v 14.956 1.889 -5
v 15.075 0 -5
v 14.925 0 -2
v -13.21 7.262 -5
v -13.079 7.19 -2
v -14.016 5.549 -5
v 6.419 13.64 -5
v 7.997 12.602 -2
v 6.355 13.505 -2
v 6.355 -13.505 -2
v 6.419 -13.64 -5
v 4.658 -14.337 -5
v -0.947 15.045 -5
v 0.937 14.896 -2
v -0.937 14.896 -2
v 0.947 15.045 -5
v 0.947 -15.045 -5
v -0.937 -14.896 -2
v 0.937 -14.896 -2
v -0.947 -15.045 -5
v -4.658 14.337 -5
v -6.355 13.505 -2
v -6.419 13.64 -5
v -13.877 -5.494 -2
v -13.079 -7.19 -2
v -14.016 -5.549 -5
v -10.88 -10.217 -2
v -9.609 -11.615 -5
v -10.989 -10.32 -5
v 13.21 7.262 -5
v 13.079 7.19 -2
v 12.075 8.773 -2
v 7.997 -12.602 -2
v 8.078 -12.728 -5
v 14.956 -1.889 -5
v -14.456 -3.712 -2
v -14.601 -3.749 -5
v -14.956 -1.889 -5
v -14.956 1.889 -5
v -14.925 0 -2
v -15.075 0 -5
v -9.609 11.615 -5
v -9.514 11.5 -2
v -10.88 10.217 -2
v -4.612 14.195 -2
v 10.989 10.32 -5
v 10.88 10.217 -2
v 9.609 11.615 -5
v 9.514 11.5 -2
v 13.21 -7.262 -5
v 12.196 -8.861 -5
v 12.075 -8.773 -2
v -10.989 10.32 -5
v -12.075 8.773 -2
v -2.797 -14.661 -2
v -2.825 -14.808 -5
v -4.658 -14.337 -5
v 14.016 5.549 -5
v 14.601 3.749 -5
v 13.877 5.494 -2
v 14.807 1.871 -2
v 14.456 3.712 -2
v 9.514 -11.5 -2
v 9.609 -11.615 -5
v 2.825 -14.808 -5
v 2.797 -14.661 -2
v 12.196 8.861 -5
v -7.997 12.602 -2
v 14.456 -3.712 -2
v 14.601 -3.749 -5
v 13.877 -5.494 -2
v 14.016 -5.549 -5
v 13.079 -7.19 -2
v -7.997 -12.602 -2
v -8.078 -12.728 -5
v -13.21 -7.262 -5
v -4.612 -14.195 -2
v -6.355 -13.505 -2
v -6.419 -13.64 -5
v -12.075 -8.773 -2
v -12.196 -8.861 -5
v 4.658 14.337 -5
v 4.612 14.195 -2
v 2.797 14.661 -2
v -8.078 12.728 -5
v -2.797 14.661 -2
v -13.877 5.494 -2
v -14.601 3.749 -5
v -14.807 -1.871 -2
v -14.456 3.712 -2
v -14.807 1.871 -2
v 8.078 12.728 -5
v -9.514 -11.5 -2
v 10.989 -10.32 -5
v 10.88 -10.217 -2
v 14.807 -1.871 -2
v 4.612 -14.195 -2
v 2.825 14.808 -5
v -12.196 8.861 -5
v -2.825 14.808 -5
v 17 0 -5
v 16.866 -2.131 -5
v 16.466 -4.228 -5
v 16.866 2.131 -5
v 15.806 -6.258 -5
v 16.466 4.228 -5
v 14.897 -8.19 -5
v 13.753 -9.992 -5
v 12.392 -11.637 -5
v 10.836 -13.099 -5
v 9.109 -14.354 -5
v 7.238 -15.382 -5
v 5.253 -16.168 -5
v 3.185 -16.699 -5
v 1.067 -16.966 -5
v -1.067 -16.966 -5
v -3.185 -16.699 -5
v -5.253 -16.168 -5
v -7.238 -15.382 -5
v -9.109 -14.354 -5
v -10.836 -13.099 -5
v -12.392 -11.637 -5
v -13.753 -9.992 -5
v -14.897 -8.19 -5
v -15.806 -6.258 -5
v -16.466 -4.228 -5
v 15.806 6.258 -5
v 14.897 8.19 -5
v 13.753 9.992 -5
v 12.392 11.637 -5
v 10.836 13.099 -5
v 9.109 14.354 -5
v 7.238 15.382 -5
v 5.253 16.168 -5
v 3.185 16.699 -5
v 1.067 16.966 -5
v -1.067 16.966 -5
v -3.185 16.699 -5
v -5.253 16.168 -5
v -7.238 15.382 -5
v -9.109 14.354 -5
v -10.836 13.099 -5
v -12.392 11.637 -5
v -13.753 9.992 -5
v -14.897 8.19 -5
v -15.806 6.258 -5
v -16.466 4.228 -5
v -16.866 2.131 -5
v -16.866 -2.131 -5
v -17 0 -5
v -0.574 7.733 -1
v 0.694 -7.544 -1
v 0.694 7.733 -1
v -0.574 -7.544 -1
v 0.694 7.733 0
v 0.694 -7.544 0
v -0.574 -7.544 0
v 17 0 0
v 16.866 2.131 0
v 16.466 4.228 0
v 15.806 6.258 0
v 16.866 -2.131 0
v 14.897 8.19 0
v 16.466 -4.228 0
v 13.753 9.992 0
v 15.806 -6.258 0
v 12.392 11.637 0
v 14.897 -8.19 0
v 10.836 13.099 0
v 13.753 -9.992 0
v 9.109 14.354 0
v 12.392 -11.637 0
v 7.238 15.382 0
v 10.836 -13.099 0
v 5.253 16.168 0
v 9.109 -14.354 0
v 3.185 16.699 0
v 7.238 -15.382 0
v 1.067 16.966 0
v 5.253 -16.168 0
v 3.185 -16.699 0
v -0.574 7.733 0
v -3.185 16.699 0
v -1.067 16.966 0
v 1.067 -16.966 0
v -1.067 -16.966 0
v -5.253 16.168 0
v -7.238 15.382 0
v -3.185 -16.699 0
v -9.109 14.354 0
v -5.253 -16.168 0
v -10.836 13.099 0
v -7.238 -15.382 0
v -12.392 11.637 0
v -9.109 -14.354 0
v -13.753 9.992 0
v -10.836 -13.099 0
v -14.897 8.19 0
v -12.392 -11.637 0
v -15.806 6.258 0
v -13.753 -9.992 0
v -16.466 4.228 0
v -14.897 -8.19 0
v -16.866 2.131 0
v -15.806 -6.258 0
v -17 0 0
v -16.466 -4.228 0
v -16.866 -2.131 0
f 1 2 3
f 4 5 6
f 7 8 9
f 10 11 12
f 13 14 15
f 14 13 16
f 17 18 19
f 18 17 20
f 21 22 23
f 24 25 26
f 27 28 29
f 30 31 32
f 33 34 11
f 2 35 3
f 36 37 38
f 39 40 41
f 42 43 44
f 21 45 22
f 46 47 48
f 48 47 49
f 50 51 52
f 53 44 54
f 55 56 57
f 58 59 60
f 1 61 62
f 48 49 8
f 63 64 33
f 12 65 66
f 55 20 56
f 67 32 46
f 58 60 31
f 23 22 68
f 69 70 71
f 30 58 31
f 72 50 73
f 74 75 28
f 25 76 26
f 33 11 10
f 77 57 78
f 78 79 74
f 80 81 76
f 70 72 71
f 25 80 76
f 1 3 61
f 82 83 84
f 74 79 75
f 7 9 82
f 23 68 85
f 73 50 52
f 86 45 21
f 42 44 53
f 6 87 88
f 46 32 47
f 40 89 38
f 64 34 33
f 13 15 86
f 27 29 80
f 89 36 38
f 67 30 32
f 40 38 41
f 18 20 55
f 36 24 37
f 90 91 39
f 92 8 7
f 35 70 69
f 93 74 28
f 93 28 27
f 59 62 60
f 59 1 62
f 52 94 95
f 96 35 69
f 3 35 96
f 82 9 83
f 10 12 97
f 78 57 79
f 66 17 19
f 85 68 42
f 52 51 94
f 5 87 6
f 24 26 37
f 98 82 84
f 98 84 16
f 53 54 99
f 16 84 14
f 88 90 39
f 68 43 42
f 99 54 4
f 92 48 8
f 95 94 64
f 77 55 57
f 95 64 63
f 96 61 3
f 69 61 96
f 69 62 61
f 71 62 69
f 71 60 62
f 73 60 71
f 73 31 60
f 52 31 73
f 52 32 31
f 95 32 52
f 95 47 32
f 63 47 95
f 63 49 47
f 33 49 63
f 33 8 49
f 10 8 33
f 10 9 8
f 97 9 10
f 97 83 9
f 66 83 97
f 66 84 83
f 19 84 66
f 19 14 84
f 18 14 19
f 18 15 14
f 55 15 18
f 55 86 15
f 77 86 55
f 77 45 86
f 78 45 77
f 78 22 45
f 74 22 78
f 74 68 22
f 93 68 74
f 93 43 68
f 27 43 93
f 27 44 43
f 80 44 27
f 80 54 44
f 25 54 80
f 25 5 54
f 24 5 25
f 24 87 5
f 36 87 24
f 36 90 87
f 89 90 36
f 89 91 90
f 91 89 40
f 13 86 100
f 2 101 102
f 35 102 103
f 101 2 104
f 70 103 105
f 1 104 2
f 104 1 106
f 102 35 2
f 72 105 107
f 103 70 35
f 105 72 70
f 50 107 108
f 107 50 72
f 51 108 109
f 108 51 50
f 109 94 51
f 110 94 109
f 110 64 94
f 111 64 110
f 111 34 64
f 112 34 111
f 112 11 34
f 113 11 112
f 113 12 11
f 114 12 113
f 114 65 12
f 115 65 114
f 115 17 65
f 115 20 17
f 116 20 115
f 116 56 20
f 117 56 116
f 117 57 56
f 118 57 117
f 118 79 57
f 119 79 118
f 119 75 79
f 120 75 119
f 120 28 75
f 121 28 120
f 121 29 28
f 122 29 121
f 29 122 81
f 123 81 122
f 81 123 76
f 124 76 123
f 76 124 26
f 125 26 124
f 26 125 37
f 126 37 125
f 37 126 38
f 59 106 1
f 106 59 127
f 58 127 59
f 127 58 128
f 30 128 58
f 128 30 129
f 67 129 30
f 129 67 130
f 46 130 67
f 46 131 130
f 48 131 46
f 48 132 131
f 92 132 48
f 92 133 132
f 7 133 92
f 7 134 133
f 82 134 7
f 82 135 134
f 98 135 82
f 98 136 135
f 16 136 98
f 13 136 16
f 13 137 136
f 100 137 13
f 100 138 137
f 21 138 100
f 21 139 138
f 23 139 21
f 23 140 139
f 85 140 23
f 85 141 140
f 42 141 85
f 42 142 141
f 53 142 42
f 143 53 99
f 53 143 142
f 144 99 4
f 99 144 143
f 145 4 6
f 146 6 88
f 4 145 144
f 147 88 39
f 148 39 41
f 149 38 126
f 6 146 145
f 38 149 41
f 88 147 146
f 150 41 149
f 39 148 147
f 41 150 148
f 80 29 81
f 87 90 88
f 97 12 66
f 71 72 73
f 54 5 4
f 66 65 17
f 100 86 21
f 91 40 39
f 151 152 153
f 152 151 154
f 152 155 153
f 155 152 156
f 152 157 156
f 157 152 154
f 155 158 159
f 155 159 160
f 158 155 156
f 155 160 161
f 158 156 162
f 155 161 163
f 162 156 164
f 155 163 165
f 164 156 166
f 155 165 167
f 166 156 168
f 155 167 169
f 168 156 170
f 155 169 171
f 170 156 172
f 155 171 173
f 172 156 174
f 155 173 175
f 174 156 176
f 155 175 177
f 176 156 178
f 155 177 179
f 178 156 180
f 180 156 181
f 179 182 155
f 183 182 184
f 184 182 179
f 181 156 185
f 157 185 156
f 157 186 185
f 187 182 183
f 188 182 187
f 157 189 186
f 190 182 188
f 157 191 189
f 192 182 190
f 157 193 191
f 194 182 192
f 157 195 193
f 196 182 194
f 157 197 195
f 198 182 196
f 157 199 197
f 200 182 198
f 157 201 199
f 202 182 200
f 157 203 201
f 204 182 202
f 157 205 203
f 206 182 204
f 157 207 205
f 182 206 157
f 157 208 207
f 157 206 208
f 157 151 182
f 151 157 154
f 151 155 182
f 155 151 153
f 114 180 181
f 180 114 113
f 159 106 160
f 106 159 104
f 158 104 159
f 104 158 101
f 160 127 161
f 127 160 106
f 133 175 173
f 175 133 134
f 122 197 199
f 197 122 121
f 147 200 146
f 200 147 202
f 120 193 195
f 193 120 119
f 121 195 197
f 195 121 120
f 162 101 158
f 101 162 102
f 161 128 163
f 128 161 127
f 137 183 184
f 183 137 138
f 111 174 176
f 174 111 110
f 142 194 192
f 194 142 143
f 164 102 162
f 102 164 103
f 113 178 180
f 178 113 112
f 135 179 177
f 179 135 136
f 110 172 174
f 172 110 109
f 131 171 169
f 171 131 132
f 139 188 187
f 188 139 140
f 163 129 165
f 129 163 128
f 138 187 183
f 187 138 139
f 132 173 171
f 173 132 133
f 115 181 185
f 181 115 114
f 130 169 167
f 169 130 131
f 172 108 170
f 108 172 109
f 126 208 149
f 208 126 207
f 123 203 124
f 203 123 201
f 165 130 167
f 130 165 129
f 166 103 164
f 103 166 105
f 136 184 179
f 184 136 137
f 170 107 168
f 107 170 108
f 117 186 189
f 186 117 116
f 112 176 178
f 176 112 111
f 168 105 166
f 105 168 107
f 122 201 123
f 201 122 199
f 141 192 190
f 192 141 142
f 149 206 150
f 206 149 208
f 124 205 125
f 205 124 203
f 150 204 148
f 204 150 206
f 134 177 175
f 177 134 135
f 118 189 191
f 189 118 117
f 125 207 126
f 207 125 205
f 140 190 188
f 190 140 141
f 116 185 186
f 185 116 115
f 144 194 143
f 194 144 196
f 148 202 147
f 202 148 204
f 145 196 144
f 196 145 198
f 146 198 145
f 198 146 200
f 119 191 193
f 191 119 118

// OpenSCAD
$fn = 50;


difference() {
	union() {
		translate(v = [0, 0, -5.0000000000]) {
			cylinder(h = 5, r = 17.0000000000);
		}
	}
	union() {
		#translate(v = [0, 0, -5.0000000000]) {
			cylinder(h = 3, r1 = 15.0750000000, r2 = 14.9250000000);
		}
		translate(v = [0, 0, -1]) {
			linear_extrude(height = 1) {
				text(font = "Wingdings", halign = "center", size = 11, text = "|", valign = "center");
			}
		}
	}
}
